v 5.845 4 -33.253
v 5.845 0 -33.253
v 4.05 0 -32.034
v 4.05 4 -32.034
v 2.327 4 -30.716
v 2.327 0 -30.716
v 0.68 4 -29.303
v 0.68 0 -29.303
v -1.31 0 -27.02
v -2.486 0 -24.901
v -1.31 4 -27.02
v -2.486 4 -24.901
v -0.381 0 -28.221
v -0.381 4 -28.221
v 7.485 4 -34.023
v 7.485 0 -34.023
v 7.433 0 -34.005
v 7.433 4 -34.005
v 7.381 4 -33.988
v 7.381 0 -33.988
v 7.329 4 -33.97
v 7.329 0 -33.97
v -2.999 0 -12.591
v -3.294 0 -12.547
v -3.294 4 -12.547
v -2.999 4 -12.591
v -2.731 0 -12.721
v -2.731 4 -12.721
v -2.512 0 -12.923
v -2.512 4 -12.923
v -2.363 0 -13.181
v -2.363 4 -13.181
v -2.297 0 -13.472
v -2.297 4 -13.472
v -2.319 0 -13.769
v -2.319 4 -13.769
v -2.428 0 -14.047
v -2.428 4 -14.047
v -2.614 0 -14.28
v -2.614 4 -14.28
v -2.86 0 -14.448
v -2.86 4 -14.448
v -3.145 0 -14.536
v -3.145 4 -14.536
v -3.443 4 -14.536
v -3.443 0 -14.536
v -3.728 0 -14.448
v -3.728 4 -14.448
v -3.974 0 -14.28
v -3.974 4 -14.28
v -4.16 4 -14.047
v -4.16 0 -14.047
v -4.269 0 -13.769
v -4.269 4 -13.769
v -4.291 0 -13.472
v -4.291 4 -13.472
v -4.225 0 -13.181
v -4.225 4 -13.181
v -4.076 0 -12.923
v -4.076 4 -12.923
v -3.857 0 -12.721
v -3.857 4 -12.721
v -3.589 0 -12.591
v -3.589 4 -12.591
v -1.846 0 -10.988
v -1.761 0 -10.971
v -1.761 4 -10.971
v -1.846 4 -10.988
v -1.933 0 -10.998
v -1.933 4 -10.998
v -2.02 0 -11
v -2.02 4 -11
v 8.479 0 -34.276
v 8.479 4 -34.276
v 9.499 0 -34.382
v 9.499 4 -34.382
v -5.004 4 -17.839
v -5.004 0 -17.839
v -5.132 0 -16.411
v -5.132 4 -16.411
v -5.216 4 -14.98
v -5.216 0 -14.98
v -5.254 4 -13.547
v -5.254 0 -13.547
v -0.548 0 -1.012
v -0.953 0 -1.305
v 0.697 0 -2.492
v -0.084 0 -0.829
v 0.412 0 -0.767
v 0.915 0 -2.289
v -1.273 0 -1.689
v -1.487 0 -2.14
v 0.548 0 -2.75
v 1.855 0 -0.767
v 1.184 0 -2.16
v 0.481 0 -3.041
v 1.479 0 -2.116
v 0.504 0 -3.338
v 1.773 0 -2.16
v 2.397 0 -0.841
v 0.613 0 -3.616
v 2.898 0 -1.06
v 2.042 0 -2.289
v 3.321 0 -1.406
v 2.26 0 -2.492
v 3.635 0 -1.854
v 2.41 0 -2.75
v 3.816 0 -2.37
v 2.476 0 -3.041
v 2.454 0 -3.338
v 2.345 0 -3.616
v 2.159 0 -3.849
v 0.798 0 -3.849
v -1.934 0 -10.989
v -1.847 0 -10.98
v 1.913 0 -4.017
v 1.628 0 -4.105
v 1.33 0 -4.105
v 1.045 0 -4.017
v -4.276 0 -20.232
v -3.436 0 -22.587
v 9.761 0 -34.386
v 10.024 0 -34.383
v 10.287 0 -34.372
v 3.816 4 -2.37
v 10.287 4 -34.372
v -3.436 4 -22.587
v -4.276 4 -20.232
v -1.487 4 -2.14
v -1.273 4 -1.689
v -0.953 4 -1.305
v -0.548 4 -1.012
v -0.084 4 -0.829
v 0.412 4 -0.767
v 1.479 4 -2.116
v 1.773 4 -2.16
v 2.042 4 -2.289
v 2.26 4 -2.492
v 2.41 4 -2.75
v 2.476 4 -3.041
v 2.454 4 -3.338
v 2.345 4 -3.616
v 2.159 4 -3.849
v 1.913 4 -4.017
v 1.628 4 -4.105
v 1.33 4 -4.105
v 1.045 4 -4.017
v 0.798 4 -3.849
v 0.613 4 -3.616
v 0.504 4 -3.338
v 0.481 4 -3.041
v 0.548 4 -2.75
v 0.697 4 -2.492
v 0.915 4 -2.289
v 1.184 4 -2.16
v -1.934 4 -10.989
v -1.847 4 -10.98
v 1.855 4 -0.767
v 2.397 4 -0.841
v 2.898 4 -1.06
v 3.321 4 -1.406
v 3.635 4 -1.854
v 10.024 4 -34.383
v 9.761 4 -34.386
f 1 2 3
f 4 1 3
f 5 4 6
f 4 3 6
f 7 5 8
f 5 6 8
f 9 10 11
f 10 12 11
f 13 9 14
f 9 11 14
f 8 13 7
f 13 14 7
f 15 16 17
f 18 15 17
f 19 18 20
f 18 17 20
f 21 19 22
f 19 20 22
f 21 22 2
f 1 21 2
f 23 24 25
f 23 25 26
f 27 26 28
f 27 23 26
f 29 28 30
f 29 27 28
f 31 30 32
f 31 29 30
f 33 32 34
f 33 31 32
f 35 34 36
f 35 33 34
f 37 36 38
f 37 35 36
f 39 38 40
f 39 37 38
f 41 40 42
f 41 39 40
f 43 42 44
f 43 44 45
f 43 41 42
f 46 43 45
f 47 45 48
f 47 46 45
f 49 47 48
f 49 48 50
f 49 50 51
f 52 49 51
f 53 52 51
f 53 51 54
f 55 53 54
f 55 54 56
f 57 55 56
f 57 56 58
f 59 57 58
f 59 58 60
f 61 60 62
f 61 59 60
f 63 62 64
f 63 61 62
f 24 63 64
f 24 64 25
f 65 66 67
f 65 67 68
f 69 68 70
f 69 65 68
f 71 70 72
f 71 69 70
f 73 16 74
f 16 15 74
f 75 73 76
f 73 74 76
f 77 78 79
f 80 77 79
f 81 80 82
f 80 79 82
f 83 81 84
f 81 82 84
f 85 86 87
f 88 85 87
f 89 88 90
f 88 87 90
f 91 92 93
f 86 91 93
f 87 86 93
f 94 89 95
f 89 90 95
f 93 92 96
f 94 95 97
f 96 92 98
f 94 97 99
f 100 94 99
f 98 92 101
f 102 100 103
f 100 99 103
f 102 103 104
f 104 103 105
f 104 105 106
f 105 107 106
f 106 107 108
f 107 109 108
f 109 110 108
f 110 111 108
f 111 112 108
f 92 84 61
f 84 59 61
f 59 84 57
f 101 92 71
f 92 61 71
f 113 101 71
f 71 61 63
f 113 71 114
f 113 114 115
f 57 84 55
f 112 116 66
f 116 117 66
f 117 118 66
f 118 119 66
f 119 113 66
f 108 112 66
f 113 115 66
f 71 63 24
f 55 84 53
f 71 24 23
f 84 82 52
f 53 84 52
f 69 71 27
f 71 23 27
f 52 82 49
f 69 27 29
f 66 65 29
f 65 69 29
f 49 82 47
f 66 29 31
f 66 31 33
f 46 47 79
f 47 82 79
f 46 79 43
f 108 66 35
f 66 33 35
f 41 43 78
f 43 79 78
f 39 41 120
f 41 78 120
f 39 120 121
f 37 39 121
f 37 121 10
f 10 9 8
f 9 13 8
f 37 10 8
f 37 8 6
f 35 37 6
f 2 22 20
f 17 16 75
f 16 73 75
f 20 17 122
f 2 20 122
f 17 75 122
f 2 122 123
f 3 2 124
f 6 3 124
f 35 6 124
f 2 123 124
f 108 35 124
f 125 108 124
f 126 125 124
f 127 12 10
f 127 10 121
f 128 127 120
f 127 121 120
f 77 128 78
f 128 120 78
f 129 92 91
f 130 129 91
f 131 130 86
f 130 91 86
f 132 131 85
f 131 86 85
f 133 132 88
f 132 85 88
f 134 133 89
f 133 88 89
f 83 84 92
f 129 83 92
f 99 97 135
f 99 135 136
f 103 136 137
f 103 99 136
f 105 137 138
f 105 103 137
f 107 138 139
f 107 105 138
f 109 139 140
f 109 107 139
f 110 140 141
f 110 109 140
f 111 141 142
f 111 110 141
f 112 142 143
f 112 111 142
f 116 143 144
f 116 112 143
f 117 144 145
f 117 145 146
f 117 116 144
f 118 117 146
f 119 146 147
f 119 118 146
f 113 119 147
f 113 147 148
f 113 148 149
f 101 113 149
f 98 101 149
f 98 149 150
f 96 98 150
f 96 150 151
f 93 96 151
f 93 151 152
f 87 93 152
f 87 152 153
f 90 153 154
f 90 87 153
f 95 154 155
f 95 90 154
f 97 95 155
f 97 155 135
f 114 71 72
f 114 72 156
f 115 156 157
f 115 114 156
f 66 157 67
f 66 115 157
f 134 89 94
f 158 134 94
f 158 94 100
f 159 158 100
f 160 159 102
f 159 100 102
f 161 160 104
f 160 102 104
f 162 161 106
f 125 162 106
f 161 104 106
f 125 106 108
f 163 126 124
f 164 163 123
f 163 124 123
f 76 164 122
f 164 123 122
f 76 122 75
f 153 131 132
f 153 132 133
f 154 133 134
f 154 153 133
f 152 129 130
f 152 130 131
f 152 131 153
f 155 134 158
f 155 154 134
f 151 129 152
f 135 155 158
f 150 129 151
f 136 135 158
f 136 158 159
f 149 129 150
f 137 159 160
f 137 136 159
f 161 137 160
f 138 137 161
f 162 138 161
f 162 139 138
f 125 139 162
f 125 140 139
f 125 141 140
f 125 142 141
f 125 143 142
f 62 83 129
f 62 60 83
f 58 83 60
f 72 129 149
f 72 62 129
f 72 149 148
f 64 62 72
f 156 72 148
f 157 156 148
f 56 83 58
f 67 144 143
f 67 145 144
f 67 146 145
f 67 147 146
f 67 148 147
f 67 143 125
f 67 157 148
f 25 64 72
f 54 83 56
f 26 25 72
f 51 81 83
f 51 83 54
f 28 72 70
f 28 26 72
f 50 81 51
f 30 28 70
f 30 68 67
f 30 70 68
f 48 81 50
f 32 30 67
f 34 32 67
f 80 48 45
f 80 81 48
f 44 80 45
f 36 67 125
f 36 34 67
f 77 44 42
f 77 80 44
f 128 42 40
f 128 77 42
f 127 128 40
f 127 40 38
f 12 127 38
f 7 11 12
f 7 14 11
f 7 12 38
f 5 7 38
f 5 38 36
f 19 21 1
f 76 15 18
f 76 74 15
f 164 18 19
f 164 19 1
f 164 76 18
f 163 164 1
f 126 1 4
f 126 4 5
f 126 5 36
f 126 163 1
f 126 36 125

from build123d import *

# Parameters (mm, degrees)
SKETCH2_R           = 1
BOSS_EXTRUDE2_DEPTH = 4
FILLET1_R           = 13
FILLET2_R           = 7
FILLET4_R           = 7


with BuildPart() as part:
    # Sketch2 → Boss-Extrude2 (new body)
    with BuildSketch(Plane(origin=(0, 0, 0), x_dir=(1, 0, 0), z_dir=(0, 1, 0))):
        with BuildLine():
            Line((-5.254491041, 13.546811275), (-1.48741211, 2.139537078))
            ThreePointArc((-1.48741211, 2.139537078), (-0.759971379, 1.145843389), (0.411712444, 0.766694098))
            Line((0.411712444, 0.766694098), (1.855419889, 0.766694098))
            ThreePointArc((1.855419889, 0.766694098), (3.121752187, 1.218662279), (3.815742579, 2.370291586))
            Line((3.815742579, 2.370291586), (10.286953209, 34.372260906))
            ThreePointArc((10.286953209, 34.372260906), (9.271638883, 34.372242241), (8.262186146, 34.263300263))
            ThreePointArc((8.262186146, 34.263300263), (7.370397326, 33.984118682), (6.494594719, 33.658236114))
            ThreePointArc((6.494594719, 33.658236114), (2.361803433, 30.744474886), (-1.353992878, 27.314777221))
            ThreePointArc((-1.353992878, 27.314777221), (-3.406730235, 22.664628668), (-5.003894853, 17.839001517))
            ThreePointArc((-5.003894853, 17.839001517), (-5.179724164, 15.695856621), (-5.254491041, 13.546811275))
        make_face()
        with Locations(Location((1.478658486, 3.11569661, 0), (0, 0, 270))):
            Circle(SKETCH2_R, mode=Mode.SUBTRACT)
        with Locations(Location((-3.294171009, 13.546811275, 0), (0, 0, 270))):
            Circle(SKETCH2_R, mode=Mode.SUBTRACT)
        with BuildLine():
            ThreePointArc((-1.76086985, 10.970987524), (-1.889568474, 10.993883735), (-2.020154104, 10.999796885))
            ThreePointArc((-2.020154104, 10.999796885), (-1.890628473, 10.984343745), (-1.76086985, 10.970987524))
        make_face(mode=Mode.SUBTRACT)
    extrude(amount=BOSS_EXTRUDE2_DEPTH)

    # Fillet1
    fillet1_edges = [part.edges().sort_by_distance(p)[0] for p in [
        (-1.353992878, 2, -27.314777221),
    ]]
    fillet(fillet1_edges, radius=FILLET1_R)

    # Fillet2
    fillet2_edges = [part.edges().sort_by_distance(p)[0] for p in [
        (8.262186146, 2, -34.263300263),
    ]]
    fillet(fillet2_edges, radius=FILLET2_R)

    # Fillet4
    fillet4_edges = [part.edges().sort_by_distance(p)[0] for p in [
        (6.494594719, 2, -33.658236114),
    ]]
    fillet(fillet4_edges, radius=FILLET4_R)


solid = part.part
